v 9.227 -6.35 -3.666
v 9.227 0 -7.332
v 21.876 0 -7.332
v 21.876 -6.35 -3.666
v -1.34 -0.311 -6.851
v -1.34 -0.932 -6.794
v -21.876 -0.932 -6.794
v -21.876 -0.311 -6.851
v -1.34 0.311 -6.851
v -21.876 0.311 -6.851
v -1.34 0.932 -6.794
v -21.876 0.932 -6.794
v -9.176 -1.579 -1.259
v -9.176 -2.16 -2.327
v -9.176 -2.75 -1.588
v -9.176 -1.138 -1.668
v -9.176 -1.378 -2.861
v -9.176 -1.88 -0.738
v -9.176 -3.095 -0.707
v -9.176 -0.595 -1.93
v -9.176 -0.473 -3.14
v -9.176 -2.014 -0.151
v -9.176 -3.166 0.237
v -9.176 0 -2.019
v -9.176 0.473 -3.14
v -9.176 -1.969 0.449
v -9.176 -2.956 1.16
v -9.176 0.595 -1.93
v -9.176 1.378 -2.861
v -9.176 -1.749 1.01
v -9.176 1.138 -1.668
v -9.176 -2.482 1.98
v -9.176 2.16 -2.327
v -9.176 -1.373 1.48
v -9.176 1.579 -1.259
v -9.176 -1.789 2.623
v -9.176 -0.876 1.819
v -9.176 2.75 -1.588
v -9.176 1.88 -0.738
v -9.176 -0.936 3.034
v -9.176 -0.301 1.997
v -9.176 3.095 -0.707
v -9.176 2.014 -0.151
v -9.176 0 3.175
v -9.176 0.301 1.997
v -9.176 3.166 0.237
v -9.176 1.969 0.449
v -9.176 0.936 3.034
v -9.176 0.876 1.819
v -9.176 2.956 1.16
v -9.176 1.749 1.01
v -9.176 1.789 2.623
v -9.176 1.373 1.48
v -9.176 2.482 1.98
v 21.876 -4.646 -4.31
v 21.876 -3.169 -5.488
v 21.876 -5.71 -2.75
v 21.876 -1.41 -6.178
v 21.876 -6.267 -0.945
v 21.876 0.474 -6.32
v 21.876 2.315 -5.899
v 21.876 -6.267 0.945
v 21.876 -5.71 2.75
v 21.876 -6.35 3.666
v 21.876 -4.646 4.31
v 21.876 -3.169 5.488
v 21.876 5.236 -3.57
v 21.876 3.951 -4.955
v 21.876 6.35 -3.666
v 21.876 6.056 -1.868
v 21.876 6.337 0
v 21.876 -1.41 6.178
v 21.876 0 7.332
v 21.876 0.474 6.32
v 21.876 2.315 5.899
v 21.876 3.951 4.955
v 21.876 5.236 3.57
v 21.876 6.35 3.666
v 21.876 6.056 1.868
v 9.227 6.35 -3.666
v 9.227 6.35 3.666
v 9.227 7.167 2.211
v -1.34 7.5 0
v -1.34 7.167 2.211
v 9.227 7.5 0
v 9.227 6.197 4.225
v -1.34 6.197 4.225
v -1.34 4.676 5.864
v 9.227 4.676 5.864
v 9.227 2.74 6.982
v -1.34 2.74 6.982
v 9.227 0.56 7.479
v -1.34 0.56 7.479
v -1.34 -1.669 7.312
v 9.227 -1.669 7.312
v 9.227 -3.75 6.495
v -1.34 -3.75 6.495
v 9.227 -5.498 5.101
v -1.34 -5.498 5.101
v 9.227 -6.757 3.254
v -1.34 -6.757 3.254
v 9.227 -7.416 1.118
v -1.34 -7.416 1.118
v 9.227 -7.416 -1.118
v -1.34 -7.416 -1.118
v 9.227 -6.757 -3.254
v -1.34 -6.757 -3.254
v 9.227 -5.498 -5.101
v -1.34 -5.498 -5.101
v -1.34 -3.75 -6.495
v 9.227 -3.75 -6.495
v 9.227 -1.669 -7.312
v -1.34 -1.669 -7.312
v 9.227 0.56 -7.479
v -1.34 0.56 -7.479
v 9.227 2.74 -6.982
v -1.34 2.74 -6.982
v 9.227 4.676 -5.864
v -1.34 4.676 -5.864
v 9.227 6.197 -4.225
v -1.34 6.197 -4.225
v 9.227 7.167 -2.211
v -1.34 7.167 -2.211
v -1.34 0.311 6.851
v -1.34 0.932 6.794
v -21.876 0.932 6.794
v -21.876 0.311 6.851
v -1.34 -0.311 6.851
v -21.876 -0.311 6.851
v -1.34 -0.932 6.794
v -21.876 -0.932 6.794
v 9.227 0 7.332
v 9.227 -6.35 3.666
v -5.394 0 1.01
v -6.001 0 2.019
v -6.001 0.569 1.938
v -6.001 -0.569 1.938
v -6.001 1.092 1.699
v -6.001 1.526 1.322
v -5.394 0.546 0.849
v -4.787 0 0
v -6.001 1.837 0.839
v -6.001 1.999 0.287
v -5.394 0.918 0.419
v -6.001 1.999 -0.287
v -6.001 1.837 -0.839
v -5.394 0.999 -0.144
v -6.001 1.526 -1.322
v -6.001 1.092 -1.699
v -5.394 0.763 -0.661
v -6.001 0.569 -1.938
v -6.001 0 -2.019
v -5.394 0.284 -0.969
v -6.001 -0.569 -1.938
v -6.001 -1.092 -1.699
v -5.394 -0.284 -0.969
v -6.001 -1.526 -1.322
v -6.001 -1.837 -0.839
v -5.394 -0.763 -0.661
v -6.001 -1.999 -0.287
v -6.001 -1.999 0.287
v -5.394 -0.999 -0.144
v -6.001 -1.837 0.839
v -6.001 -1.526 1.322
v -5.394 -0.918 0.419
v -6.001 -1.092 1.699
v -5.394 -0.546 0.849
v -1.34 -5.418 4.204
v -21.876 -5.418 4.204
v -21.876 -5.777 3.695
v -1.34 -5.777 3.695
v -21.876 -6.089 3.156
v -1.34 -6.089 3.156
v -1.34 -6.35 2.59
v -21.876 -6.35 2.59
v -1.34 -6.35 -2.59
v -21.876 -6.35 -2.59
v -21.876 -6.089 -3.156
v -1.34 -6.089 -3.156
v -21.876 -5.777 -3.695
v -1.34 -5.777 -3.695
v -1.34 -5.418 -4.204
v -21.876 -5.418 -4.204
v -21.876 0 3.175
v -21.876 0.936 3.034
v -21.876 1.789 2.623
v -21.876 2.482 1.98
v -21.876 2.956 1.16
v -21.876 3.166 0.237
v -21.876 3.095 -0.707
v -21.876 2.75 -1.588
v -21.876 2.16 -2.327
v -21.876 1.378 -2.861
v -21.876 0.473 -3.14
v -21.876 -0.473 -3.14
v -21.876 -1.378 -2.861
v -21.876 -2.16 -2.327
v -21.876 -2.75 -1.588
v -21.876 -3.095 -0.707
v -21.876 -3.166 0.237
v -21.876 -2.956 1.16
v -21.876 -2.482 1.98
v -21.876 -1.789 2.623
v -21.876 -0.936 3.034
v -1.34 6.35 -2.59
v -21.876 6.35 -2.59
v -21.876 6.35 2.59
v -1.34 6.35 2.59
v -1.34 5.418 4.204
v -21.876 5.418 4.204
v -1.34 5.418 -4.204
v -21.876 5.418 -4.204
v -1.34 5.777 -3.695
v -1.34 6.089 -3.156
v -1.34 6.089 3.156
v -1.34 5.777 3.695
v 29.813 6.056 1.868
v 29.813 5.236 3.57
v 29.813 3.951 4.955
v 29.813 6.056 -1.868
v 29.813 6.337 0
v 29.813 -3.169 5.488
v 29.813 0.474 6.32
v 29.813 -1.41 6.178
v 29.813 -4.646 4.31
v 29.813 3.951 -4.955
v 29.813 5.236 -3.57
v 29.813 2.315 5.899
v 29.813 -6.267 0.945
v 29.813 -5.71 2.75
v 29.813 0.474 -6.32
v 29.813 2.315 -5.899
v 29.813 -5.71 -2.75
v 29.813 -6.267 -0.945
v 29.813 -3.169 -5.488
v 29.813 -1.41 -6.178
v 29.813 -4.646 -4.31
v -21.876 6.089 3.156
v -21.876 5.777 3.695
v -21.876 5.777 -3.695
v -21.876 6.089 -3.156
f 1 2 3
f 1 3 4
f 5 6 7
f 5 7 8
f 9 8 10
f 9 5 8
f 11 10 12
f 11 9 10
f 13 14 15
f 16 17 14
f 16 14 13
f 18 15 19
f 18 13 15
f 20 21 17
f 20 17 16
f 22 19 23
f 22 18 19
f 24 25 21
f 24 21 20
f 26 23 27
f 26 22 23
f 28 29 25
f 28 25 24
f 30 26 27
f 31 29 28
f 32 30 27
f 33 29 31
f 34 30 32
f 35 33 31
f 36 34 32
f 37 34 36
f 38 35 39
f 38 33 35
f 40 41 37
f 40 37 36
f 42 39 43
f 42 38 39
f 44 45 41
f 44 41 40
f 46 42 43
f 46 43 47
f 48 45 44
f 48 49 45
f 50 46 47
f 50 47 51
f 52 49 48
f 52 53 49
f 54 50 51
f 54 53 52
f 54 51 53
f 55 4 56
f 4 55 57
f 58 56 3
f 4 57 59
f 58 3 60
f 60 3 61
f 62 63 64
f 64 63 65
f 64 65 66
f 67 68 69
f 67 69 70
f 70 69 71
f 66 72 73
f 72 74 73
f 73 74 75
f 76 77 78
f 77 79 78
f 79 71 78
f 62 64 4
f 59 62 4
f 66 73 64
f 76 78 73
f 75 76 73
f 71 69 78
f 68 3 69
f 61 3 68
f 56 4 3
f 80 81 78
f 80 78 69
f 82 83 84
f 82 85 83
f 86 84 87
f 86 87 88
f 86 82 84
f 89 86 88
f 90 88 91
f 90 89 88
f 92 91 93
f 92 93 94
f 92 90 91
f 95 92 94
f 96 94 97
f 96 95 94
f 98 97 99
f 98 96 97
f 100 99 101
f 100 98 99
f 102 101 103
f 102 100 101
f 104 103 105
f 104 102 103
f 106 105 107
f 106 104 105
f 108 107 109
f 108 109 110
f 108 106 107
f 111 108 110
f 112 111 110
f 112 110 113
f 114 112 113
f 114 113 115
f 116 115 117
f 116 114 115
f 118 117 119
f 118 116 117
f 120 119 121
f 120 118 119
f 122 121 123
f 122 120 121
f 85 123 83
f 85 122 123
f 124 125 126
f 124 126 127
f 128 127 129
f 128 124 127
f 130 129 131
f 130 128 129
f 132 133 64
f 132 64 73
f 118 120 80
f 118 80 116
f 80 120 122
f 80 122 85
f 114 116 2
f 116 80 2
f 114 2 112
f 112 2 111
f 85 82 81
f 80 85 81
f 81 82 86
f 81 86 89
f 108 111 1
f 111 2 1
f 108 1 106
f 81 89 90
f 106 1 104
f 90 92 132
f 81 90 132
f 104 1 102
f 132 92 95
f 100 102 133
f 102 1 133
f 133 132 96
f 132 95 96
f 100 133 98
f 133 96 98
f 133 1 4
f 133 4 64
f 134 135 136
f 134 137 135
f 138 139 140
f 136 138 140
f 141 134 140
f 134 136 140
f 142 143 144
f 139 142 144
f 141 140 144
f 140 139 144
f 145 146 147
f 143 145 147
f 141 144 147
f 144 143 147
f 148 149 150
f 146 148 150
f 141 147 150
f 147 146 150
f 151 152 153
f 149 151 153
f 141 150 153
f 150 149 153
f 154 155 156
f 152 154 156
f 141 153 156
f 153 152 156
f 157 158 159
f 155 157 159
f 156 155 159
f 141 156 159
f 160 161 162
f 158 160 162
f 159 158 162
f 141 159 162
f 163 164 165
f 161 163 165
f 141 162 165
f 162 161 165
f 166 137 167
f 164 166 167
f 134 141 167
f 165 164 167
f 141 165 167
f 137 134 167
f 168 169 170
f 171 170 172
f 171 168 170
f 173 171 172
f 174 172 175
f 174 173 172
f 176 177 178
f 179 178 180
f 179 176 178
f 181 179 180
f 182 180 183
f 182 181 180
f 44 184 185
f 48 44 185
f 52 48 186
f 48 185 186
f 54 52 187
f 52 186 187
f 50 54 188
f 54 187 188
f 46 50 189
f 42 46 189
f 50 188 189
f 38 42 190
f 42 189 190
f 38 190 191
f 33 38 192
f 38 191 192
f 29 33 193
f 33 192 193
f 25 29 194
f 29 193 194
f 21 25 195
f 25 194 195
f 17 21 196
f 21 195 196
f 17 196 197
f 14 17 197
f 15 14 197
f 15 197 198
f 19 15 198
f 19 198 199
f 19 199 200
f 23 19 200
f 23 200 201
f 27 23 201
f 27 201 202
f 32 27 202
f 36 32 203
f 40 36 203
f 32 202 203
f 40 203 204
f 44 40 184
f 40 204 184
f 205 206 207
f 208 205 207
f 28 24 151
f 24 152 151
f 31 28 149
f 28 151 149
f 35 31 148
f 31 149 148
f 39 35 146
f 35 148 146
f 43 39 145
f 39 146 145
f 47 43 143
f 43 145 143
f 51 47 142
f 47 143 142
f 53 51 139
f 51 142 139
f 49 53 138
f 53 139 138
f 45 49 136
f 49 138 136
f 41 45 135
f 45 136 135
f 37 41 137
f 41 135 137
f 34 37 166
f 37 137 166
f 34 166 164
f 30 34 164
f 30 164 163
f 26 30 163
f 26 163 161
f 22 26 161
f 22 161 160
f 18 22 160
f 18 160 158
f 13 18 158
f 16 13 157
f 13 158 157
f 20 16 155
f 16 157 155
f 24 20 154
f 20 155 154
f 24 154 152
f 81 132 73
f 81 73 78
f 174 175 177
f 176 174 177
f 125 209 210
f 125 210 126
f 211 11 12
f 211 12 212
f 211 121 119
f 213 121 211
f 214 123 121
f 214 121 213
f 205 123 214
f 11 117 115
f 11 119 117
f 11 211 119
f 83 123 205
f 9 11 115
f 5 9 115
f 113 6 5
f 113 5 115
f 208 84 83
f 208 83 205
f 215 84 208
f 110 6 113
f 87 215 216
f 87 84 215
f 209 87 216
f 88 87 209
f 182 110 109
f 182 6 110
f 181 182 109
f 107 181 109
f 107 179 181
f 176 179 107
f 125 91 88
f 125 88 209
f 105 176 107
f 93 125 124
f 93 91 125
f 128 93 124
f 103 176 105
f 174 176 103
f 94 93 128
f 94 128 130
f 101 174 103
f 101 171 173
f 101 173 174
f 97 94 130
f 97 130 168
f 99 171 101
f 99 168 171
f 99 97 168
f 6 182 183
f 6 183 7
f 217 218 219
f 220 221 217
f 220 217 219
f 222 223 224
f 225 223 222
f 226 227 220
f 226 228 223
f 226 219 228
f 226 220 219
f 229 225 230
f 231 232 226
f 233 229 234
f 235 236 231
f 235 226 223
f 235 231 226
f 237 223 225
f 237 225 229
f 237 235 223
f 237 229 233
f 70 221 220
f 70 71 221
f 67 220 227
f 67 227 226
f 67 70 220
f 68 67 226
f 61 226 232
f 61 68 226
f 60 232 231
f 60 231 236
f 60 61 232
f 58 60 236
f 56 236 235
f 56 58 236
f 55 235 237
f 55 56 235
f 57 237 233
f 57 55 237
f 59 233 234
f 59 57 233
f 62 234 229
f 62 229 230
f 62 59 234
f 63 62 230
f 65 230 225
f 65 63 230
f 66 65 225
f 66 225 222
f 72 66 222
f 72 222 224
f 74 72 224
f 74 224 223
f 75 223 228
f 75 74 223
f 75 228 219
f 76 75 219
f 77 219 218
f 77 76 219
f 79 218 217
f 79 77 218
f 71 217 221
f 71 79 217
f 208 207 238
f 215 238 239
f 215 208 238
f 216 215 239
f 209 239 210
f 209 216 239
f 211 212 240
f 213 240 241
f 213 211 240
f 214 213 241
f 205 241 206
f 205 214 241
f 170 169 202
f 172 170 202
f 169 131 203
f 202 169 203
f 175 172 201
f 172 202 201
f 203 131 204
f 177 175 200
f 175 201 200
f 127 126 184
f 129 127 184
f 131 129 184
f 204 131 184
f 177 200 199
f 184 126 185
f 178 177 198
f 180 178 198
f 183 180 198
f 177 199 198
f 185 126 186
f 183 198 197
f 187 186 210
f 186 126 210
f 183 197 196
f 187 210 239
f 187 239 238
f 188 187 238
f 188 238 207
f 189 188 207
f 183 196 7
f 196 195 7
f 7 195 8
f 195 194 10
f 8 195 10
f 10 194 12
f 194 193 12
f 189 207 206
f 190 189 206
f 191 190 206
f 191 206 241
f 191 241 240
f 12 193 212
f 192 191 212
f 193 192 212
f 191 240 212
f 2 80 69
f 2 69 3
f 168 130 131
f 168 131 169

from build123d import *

# Parameters (mm, degrees)
SKETCH1_W                       = 10.5664
SKETCH1_H                       = 7.5
BOSS_EXTRUDE1_DEPTH             = 20.5359
BOSS_EXTRUDE2_DEPTH             = 12.6492
SKETCH4_W                       = 7.9375
SKETCH4_H                       = 6.3373
F_21_0_159_DIAMETER_HOLE1_D     = 4.0386
F_21_0_159_DIAMETER_HOLE1_DEPTH = 15.875
F_21_0_159_DIAMETER_HOLE1_TIP   = 1.213317848
SKETCH7_R                       = 3.175
CUT_EXTRUDE1_DEPTH              = 12.7


with BuildPart() as part:
    # Sketch1 → Revolve1 (revolve)
    with BuildSketch(Plane.XY):
        with Locations((3.94335, 3.75)):
            Rectangle(SKETCH1_W, SKETCH1_H)
    revolve(axis=Axis((-1.33985, 0, 0), (1, 0, 0)))

    # Sketch2 → Boss-Extrude1 (add)
    with BuildSketch(Plane.ZY.offset(1.33985)):
        with BuildLine():
            Line((-2.590301913, 6.35), (2.590301913, 6.35))
            ThreePointArc((2.590301913, 6.35), (3.429, 5.939202219), (4.204110358, 5.41826726))
            Line((4.204110358, 5.41826726), (6.79441227, 0.93173274))
            ThreePointArc((6.79441227, 0.93173274), (6.858, 0), (6.79441227, -0.93173274))
            Line((6.79441227, -0.93173274), (4.204110358, -5.41826726))
            ThreePointArc((4.204110358, -5.41826726), (3.429, -5.939202219), (2.590301913, -6.35))
            Line((2.590301913, -6.35), (-2.590301913, -6.35))
            ThreePointArc((-2.590301913, -6.35), (-3.429, -5.939202219), (-4.204110358, -5.41826726))
            Line((-4.204110358, -5.41826726), (-6.79441227, -0.93173274))
            ThreePointArc((-6.79441227, -0.93173274), (-6.858, 0), (-6.79441227, 0.93173274))
            Line((-6.79441227, 0.93173274), (-4.204110358, 5.41826726))
            ThreePointArc((-4.204110358, 5.41826726), (-3.429, 5.939202219), (-2.590301913, 6.35))
        make_face()
    extrude(amount=BOSS_EXTRUDE1_DEPTH)

    # Sketch3 → Boss-Extrude2 (add)
    with BuildSketch(Plane(origin=(9.22655, 0, 0), x_dir=(0, 0, -1), z_dir=(1, 0, 0))):
        Polygon((3.666174209, -6.35), (-3.666174209, -6.35), (-7.332348419, 0), (-3.666174209, 6.35), (3.666174209, 6.35), (7.332348419, 0), align=None)
    extrude(amount=BOSS_EXTRUDE2_DEPTH)

    # Sketch4 → Revolve2 (revolve)
    with BuildSketch(Plane(origin=(0, 0, 0), x_dir=(-1, 0, 0), z_dir=(0, 0, -1))):
        with Locations((-25.8445, 3.16865)):
            Rectangle(SKETCH4_W, SKETCH4_H)
    revolve(axis=Axis((29.81325, 0, 0), (-1, 0, 0)))

    # #21 (0.159) Diameter Hole1
    with Locations(Plane.ZY.offset(21.87575)):
        with Locations((0, 0)):
            Hole(F_21_0_159_DIAMETER_HOLE1_D / 2, depth=F_21_0_159_DIAMETER_HOLE1_DEPTH)
            with Locations((0, 0, -(F_21_0_159_DIAMETER_HOLE1_DEPTH + F_21_0_159_DIAMETER_HOLE1_TIP / 2))):  # 118° drill point
                Cone(0, F_21_0_159_DIAMETER_HOLE1_D / 2, F_21_0_159_DIAMETER_HOLE1_TIP, mode=Mode.SUBTRACT)

    # Sketch7 → Cut-Extrude1 (cut)
    with BuildSketch(Plane.ZY.offset(21.87575)):
        Circle(SKETCH7_R)
    extrude(amount=-CUT_EXTRUDE1_DEPTH, mode=Mode.SUBTRACT)


solid = part.part
